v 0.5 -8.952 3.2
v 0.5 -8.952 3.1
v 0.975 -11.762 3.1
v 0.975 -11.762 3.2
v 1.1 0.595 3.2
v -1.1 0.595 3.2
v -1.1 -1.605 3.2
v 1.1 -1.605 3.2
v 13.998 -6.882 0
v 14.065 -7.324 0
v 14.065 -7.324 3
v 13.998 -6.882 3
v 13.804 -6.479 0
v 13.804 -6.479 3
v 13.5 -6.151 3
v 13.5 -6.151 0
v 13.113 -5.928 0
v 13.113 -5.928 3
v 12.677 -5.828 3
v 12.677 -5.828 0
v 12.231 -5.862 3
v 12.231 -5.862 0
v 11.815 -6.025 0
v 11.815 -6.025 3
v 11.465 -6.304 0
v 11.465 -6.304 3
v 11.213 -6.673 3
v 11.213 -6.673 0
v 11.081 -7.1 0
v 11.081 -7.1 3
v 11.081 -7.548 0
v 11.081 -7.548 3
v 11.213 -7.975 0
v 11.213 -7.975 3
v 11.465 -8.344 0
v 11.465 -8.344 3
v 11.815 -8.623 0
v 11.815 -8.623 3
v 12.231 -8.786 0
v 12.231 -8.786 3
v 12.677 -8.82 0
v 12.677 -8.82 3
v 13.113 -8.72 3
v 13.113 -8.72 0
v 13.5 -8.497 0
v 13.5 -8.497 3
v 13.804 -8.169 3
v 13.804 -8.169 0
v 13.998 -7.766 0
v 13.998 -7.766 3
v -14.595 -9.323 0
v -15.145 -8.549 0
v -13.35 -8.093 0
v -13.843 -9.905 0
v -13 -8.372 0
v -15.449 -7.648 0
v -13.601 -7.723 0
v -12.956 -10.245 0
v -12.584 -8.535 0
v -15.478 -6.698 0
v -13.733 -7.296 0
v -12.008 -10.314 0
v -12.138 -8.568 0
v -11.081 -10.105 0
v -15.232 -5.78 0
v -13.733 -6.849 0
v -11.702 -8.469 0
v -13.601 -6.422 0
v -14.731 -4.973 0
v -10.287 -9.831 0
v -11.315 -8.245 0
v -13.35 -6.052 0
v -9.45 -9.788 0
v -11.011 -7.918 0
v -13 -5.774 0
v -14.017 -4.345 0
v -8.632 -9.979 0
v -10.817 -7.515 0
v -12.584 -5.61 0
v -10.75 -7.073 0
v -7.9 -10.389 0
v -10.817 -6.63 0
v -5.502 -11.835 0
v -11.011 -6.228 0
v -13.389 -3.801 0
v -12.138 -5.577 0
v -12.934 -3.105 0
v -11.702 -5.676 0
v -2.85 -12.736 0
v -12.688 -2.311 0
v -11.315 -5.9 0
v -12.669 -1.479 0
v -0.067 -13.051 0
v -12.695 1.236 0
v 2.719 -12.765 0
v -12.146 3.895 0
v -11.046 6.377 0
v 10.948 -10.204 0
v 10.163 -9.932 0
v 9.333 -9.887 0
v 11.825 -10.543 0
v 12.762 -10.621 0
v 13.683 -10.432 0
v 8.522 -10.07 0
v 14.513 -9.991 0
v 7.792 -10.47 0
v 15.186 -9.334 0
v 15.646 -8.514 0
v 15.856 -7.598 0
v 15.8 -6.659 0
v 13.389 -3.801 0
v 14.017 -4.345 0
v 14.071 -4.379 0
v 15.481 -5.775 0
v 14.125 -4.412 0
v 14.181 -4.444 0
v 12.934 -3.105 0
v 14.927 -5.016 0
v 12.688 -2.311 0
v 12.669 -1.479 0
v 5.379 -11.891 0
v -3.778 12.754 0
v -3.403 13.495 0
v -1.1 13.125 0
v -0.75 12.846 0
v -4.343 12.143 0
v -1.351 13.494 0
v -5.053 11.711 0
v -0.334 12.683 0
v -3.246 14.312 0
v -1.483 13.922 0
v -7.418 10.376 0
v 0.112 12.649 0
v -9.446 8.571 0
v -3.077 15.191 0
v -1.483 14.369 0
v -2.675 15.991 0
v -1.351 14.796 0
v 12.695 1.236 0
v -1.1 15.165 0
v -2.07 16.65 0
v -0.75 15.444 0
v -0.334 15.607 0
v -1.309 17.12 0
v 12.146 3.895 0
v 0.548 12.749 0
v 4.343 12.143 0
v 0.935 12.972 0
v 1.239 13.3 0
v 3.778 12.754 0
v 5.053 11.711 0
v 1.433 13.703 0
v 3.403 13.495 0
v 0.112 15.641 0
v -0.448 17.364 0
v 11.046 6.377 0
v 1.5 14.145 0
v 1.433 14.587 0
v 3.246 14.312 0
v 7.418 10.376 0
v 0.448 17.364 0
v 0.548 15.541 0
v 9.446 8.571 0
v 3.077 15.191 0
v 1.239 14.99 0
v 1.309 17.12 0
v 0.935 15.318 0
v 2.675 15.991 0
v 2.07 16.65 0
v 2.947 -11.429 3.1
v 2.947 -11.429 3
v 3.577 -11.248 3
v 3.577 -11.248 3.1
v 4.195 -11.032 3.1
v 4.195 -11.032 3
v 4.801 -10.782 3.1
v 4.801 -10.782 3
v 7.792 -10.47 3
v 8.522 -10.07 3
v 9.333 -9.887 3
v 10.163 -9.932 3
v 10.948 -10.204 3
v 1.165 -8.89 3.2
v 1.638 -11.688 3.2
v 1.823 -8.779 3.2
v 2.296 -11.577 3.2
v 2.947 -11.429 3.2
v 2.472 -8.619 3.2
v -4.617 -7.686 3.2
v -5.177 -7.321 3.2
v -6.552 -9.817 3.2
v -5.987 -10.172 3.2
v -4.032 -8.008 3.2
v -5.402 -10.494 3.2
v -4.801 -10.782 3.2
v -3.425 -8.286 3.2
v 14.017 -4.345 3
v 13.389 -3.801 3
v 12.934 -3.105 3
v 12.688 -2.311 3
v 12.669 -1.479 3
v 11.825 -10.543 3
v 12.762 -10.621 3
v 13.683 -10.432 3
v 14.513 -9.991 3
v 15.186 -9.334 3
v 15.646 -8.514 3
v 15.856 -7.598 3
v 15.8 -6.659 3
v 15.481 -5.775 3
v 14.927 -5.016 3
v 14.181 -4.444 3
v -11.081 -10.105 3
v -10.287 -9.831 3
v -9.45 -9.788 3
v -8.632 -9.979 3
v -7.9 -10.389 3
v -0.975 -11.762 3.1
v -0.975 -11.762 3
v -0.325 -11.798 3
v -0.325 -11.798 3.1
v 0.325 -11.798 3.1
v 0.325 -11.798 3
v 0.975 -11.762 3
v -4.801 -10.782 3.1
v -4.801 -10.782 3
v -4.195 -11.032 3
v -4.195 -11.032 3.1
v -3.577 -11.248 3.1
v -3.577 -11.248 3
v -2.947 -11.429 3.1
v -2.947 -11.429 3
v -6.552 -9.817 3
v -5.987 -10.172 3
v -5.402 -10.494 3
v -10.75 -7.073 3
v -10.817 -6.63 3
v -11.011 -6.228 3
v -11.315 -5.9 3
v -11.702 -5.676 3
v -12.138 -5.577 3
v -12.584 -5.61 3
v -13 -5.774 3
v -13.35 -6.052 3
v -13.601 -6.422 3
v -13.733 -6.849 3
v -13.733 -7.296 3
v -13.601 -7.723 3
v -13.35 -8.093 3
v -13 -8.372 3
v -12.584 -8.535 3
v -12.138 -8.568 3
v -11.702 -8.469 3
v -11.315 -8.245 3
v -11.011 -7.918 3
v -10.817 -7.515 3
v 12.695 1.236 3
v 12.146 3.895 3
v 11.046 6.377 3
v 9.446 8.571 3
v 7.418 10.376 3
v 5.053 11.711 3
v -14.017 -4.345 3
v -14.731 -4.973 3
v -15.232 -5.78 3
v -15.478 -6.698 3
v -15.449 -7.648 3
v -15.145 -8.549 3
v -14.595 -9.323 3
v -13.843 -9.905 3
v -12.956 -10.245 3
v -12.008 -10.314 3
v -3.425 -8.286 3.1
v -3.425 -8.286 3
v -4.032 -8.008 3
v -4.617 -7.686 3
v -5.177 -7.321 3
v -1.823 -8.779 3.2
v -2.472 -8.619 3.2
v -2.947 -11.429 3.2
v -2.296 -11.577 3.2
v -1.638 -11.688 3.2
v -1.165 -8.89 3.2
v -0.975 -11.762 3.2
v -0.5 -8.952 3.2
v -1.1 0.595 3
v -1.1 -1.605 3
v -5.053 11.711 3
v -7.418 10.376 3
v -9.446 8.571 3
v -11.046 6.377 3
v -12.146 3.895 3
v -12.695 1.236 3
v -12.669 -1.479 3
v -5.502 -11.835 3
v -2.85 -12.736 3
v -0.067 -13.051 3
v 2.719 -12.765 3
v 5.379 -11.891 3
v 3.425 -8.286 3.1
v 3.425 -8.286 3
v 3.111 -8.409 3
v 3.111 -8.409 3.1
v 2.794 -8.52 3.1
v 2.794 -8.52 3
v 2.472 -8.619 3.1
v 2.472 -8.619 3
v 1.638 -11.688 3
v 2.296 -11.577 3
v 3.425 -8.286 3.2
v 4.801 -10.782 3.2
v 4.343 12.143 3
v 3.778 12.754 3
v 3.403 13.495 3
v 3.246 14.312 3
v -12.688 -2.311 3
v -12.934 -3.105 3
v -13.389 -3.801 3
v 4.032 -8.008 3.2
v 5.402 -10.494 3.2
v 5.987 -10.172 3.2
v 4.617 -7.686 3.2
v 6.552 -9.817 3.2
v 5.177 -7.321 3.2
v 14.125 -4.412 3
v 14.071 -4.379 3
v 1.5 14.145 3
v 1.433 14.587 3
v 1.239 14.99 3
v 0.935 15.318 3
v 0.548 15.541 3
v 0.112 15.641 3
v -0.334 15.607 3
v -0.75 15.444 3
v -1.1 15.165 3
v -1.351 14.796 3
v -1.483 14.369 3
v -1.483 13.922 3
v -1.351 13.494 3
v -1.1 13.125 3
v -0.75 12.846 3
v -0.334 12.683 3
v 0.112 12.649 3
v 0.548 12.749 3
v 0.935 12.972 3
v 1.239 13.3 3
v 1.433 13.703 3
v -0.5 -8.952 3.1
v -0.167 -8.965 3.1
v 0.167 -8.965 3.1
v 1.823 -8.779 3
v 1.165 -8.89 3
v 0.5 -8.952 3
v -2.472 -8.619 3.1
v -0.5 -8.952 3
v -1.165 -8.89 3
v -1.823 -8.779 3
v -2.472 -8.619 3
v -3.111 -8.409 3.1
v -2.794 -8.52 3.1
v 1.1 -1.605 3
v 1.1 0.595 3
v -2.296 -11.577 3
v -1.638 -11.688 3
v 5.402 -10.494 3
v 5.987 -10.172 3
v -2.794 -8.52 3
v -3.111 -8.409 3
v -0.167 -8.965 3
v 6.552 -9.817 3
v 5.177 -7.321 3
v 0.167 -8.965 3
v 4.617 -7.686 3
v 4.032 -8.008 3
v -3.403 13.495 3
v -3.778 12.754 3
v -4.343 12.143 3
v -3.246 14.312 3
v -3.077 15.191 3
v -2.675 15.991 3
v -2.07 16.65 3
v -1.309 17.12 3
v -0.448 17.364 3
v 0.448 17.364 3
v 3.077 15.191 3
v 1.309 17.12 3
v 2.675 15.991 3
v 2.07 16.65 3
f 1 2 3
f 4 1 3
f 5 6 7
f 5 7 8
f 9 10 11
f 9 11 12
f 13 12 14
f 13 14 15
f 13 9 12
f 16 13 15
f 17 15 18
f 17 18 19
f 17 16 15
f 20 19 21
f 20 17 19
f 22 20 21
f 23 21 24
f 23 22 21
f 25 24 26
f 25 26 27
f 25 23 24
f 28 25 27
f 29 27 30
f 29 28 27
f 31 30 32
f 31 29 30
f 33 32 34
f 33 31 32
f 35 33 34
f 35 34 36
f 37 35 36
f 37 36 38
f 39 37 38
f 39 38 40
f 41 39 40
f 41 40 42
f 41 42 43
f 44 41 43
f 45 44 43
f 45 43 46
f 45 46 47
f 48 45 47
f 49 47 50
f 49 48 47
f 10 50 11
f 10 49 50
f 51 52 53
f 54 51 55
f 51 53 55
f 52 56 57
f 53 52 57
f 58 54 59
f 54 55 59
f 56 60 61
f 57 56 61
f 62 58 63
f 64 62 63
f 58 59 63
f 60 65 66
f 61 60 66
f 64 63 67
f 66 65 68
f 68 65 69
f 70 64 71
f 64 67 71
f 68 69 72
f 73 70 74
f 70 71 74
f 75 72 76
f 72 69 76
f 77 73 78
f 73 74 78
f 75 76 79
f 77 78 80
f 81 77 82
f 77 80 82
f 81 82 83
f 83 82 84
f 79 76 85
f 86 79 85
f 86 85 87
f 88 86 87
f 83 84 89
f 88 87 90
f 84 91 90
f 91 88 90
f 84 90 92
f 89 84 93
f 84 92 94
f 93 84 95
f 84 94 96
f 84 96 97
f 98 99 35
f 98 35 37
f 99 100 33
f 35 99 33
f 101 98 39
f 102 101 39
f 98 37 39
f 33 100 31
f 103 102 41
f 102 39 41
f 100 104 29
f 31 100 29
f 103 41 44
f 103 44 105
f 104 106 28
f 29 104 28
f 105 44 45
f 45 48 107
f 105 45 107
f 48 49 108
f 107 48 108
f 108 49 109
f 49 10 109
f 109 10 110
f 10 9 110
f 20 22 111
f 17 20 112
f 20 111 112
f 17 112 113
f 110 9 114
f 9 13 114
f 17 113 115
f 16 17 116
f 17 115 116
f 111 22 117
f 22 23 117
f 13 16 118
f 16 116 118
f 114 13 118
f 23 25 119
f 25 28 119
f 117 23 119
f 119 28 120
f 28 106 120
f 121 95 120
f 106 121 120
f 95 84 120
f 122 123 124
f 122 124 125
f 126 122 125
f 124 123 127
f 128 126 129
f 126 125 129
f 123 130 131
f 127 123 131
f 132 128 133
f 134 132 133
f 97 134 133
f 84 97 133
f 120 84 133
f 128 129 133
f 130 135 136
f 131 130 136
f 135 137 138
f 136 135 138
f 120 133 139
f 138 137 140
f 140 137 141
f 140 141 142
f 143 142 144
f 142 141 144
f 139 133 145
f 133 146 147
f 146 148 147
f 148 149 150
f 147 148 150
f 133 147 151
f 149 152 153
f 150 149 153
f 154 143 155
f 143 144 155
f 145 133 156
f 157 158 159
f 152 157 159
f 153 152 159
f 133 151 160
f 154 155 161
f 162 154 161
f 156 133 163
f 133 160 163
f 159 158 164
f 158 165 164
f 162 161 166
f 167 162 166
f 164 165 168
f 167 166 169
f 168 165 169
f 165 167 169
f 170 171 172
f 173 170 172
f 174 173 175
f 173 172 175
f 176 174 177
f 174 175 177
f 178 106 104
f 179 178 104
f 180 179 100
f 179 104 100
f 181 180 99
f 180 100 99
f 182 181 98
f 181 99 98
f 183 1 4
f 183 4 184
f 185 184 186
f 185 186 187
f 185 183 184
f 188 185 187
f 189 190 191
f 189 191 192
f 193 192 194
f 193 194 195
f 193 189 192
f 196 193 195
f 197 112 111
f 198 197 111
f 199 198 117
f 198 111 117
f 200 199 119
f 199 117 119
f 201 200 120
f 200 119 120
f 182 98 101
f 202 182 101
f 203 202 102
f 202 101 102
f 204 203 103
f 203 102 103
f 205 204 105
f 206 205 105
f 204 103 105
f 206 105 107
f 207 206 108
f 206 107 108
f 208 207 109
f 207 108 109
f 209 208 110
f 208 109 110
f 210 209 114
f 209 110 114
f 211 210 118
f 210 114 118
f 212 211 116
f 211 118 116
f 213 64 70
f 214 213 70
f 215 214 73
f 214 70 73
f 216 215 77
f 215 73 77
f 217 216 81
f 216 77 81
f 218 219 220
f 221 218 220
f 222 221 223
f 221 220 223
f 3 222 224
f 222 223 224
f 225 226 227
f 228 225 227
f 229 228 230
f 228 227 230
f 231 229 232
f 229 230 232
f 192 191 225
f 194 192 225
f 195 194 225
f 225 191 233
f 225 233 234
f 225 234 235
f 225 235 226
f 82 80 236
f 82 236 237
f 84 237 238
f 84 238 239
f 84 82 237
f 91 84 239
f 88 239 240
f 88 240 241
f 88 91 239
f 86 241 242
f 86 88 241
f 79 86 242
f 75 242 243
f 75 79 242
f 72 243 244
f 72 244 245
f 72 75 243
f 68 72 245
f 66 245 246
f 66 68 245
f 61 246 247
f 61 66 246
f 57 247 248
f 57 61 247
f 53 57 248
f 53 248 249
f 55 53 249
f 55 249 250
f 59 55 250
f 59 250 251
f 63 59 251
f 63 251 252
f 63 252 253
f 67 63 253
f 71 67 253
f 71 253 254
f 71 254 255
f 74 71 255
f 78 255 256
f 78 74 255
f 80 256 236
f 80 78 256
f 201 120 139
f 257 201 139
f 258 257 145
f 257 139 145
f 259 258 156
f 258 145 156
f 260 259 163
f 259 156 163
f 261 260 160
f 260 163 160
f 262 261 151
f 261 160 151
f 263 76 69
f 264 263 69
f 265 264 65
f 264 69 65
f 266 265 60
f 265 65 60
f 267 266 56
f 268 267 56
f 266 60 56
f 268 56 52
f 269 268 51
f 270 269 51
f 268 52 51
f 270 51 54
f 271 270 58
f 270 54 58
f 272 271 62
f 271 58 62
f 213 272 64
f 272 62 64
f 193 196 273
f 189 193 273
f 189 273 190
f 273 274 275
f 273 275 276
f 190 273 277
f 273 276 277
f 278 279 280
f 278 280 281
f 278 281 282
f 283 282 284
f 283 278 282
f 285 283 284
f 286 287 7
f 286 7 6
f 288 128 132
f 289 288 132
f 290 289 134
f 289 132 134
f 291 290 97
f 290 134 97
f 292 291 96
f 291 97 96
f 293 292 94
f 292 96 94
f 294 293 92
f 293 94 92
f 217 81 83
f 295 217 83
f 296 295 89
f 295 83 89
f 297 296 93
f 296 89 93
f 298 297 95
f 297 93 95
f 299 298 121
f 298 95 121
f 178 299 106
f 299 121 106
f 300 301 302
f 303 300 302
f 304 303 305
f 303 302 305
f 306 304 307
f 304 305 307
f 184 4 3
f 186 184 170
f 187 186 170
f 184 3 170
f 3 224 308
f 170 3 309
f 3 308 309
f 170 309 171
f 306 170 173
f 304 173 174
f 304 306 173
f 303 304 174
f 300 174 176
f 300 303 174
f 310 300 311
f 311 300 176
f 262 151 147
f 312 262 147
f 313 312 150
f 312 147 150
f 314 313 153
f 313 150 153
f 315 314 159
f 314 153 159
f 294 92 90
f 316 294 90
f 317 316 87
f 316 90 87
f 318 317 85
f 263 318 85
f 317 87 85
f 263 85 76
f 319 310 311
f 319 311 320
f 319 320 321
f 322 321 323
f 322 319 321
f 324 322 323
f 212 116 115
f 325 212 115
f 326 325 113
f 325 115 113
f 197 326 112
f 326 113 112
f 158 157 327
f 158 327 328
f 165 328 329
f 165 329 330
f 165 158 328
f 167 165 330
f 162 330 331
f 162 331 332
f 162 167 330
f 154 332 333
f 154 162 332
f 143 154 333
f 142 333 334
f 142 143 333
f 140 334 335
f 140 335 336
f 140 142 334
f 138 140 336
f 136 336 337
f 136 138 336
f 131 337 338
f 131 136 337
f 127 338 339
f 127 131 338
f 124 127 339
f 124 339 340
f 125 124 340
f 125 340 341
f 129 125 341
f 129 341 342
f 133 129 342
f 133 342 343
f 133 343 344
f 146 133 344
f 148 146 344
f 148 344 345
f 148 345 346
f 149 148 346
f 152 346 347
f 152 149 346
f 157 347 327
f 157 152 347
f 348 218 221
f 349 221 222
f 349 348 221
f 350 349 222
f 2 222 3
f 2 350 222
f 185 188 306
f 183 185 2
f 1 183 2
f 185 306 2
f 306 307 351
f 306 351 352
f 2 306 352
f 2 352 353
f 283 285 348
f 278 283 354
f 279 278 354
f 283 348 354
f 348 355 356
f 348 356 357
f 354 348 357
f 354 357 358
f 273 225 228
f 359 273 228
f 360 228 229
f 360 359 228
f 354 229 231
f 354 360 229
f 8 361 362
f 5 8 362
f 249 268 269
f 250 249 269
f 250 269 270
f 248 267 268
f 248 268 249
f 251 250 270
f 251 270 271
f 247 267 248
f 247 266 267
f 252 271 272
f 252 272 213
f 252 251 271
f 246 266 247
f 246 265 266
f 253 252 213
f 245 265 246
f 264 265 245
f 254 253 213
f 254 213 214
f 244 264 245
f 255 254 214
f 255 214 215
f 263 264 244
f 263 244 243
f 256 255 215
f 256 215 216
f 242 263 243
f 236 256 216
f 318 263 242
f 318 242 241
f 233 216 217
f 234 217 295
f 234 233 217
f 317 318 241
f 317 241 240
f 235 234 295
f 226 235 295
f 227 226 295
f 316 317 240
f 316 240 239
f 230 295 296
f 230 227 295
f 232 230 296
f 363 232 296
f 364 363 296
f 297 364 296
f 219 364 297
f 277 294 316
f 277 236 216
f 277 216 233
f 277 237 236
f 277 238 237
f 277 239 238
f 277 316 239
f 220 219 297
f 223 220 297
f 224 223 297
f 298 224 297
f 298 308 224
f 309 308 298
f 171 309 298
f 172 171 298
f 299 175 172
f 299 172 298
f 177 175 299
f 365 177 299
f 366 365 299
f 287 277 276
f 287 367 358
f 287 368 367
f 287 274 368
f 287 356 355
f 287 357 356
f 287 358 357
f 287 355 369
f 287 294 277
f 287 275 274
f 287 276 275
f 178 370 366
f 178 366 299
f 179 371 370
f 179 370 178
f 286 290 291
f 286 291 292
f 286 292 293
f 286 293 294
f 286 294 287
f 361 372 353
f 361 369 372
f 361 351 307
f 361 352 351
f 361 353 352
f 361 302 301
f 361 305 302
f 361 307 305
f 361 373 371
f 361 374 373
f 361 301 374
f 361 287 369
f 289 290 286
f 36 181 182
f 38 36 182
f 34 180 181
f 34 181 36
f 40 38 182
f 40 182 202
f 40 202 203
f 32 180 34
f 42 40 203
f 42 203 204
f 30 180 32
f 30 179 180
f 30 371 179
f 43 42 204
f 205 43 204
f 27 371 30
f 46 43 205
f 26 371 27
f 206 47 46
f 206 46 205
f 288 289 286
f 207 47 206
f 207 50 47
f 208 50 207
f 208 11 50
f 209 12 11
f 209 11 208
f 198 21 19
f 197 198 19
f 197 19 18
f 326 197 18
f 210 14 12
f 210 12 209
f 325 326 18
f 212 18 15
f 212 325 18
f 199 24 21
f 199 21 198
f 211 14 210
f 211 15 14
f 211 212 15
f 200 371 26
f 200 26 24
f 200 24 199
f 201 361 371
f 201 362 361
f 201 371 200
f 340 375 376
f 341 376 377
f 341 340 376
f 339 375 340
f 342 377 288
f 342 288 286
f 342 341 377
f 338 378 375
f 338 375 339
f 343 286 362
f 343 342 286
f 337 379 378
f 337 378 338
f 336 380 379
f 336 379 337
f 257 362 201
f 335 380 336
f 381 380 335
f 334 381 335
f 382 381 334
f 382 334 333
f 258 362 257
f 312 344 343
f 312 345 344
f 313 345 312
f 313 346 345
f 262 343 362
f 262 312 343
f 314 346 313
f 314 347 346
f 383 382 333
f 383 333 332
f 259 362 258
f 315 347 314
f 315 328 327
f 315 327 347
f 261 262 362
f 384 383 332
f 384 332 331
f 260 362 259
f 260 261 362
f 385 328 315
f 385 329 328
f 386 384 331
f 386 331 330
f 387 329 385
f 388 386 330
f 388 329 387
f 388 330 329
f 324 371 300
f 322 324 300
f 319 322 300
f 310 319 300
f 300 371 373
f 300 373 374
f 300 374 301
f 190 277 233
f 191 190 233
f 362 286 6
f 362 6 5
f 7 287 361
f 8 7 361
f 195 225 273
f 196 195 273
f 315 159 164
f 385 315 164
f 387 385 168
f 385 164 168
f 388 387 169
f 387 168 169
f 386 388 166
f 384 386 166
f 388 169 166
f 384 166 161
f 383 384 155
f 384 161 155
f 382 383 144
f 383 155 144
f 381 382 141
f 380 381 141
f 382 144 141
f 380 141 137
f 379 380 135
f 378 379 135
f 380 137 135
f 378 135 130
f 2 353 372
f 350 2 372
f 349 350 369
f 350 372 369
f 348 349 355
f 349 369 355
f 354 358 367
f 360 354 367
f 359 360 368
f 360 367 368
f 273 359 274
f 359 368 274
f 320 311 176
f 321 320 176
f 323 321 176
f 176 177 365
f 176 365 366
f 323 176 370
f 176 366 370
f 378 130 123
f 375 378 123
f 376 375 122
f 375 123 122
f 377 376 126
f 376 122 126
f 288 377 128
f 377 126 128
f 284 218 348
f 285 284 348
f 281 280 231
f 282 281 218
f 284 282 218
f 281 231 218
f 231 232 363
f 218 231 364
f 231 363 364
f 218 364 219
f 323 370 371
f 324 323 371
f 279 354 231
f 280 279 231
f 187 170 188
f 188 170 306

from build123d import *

# Parameters (mm, degrees)
F0_R     = 1.5
F1_DEPTH = 3
F2_W     = 2.2
F2_H     = 2.2
F3_DEPTH = 0.2
F5_DEPTH = 0.1
F6_DEPTH = 0.2


with BuildPart() as f1:
    # F0 (on Top) → F1 (new body)
    with BuildSketch(Plane.XY):
        with BuildLine():
            ThreePointArc((5.053231, 11.711225), (3.778342, 12.753574), (3.24572, 14.311827))
            ThreePointArc((3.24572, 14.311827), (0, 17.395082), (-3.24572, 14.311827))
            ThreePointArc((-3.24572, 14.311827), (-3.778342, 12.753574), (-5.053231, 11.711225))
            ThreePointArc((-5.053231, 11.711225), (-11.046083, 6.377459), (-12.668834, -1.479386))
            ThreePointArc((-12.668834, -1.479386), (-12.93409, -3.104647), (-14.017265, -4.345038))
            ThreePointArc((-14.017265, -4.345038), (-15.14542, -8.548699), (-11.080733, -10.104918))
            ThreePointArc((-11.080733, -10.104918), (-9.449522, -9.788391), (-7.900064, -10.388572))
            ThreePointArc((-7.900064, -10.388572), (-0.067306, -13.051011), (7.792495, -10.469501))
            ThreePointArc((7.792495, -10.469501), (9.332641, -9.886588), (10.948438, -10.20445))
            ThreePointArc((10.948438, -10.20445), (15.444934, -8.940161), (14.180645, -4.443665))
            ThreePointArc((14.180645, -4.443665), (14.098171, -4.395651), (14.017265, -4.345038))
            ThreePointArc((14.017265, -4.345038), (12.93409, -3.104647), (12.668834, -1.479386))
            ThreePointArc((12.668834, -1.479386), (11.046083, 6.377459), (5.053231, 11.711225))
        make_face()
        with Locations((-12.25, -7.072541)):
            Circle(F0_R, mode=Mode.SUBTRACT)
        with Locations((12.564541, -7.324058)):
            Circle(F0_R, mode=Mode.SUBTRACT)
        with Locations((0, 14.145082)):
            Circle(F0_R, mode=Mode.SUBTRACT)
    extrude(amount=F1_DEPTH)

    # F2 (on face) → F3 (join)
    with BuildSketch(Plane.XY.offset(3)):
        with Locations((0, -0.504918)):
            Rectangle(F2_W, F2_H)
    extrude(amount=F3_DEPTH)

    # F4 (on face) → F5 (join)
    with BuildSketch(Plane.XY.offset(3)):
        with BuildLine():
            Line((-4.80058, -10.782232), (-3.42495, -8.286207))
            ThreePointArc((-3.42495, -8.286207), (-4.327749, -7.852521), (-5.176546, -7.320852))
            Line((-5.176546, -7.320852), (-6.552177, -9.816877))
            ThreePointArc((-6.552177, -9.816877), (-5.696863, -10.336723), (-4.80058, -10.782232))
        make_face()
        with BuildLine():
            Line((-2.94705, -11.428779), (-2.471803, -8.618683))
            ThreePointArc((-2.471803, -8.618683), (-2.953059, -8.465869), (-3.42495, -8.286207))
            Line((-3.42495, -8.286207), (-4.80058, -10.782232))
            ThreePointArc((-4.80058, -10.782232), (-3.88728, -11.144108), (-2.94705, -11.428779))
        make_face()
        with BuildLine():
            ThreePointArc((-0.499806, -8.952189), (-1.495132, -8.840593), (-2.471803, -8.618683))
            Line((-2.471803, -8.618683), (-2.94705, -11.428779))
            ThreePointArc((-2.94705, -11.428779), (-1.968128, -11.637378), (-0.975053, -11.762286))
            Line((-0.975053, -11.762286), (-0.499806, -8.952189))
        make_face()
        with BuildLine():
            ThreePointArc((0.499806, -8.952189), (0, -8.966131), (-0.499806, -8.952189))
            Line((-0.499806, -8.952189), (-0.975053, -11.762286))
            ThreePointArc((-0.975053, -11.762286), (0, -11.802631), (0.975053, -11.762286))
            Line((0.975053, -11.762286), (0.499806, -8.952189))
        make_face()
        with BuildLine():
            ThreePointArc((2.471803, -8.618683), (1.495132, -8.840593), (0.499806, -8.952189))
            Line((0.499806, -8.952189), (0.975053, -11.762286))
            ThreePointArc((0.975053, -11.762286), (1.968128, -11.637378), (2.94705, -11.428779))
            Line((2.94705, -11.428779), (2.471803, -8.618683))
        make_face()
        with BuildLine():
            ThreePointArc((3.42495, -8.286207), (2.953059, -8.465869), (2.471803, -8.618683))
            Line((2.471803, -8.618683), (2.94705, -11.428779))
            ThreePointArc((2.94705, -11.428779), (3.88728, -11.144108), (4.80058, -10.782232))
            Line((4.80058, -10.782232), (3.42495, -8.286207))
        make_face()
        with BuildLine():
            ThreePointArc((5.176546, -7.320852), (4.327749, -7.852521), (3.42495, -8.286207))
            Line((3.42495, -8.286207), (4.80058, -10.782232))
            ThreePointArc((4.80058, -10.782232), (5.696863, -10.336723), (6.552177, -9.816877))
            Line((6.552177, -9.816877), (5.176546, -7.320852))
        make_face()
    extrude(amount=F5_DEPTH)

    # F4 (on face) → F6 (join)
    with BuildSketch(Plane.XY.offset(3)):
        with BuildLine():
            Line((-4.80058, -10.782232), (-3.42495, -8.286207))
            ThreePointArc((-3.42495, -8.286207), (-4.327749, -7.852521), (-5.176546, -7.320852))
            Line((-5.176546, -7.320852), (-6.552177, -9.816877))
            ThreePointArc((-6.552177, -9.816877), (-5.696863, -10.336723), (-4.80058, -10.782232))
        make_face()
        with BuildLine():
            ThreePointArc((-0.499806, -8.952189), (-1.495132, -8.840593), (-2.471803, -8.618683))
            Line((-2.471803, -8.618683), (-2.94705, -11.428779))
            ThreePointArc((-2.94705, -11.428779), (-1.968128, -11.637378), (-0.975053, -11.762286))
            Line((-0.975053, -11.762286), (-0.499806, -8.952189))
        make_face()
        with BuildLine():
            ThreePointArc((2.471803, -8.618683), (1.495132, -8.840593), (0.499806, -8.952189))
            Line((0.499806, -8.952189), (0.975053, -11.762286))
            ThreePointArc((0.975053, -11.762286), (1.968128, -11.637378), (2.94705, -11.428779))
            Line((2.94705, -11.428779), (2.471803, -8.618683))
        make_face()
        with BuildLine():
            ThreePointArc((5.176546, -7.320852), (4.327749, -7.852521), (3.42495, -8.286207))
            Line((3.42495, -8.286207), (4.80058, -10.782232))
            ThreePointArc((4.80058, -10.782232), (5.696863, -10.336723), (6.552177, -9.816877))
            Line((6.552177, -9.816877), (5.176546, -7.320852))
        make_face()
    extrude(amount=F6_DEPTH)


solid = f1.part
